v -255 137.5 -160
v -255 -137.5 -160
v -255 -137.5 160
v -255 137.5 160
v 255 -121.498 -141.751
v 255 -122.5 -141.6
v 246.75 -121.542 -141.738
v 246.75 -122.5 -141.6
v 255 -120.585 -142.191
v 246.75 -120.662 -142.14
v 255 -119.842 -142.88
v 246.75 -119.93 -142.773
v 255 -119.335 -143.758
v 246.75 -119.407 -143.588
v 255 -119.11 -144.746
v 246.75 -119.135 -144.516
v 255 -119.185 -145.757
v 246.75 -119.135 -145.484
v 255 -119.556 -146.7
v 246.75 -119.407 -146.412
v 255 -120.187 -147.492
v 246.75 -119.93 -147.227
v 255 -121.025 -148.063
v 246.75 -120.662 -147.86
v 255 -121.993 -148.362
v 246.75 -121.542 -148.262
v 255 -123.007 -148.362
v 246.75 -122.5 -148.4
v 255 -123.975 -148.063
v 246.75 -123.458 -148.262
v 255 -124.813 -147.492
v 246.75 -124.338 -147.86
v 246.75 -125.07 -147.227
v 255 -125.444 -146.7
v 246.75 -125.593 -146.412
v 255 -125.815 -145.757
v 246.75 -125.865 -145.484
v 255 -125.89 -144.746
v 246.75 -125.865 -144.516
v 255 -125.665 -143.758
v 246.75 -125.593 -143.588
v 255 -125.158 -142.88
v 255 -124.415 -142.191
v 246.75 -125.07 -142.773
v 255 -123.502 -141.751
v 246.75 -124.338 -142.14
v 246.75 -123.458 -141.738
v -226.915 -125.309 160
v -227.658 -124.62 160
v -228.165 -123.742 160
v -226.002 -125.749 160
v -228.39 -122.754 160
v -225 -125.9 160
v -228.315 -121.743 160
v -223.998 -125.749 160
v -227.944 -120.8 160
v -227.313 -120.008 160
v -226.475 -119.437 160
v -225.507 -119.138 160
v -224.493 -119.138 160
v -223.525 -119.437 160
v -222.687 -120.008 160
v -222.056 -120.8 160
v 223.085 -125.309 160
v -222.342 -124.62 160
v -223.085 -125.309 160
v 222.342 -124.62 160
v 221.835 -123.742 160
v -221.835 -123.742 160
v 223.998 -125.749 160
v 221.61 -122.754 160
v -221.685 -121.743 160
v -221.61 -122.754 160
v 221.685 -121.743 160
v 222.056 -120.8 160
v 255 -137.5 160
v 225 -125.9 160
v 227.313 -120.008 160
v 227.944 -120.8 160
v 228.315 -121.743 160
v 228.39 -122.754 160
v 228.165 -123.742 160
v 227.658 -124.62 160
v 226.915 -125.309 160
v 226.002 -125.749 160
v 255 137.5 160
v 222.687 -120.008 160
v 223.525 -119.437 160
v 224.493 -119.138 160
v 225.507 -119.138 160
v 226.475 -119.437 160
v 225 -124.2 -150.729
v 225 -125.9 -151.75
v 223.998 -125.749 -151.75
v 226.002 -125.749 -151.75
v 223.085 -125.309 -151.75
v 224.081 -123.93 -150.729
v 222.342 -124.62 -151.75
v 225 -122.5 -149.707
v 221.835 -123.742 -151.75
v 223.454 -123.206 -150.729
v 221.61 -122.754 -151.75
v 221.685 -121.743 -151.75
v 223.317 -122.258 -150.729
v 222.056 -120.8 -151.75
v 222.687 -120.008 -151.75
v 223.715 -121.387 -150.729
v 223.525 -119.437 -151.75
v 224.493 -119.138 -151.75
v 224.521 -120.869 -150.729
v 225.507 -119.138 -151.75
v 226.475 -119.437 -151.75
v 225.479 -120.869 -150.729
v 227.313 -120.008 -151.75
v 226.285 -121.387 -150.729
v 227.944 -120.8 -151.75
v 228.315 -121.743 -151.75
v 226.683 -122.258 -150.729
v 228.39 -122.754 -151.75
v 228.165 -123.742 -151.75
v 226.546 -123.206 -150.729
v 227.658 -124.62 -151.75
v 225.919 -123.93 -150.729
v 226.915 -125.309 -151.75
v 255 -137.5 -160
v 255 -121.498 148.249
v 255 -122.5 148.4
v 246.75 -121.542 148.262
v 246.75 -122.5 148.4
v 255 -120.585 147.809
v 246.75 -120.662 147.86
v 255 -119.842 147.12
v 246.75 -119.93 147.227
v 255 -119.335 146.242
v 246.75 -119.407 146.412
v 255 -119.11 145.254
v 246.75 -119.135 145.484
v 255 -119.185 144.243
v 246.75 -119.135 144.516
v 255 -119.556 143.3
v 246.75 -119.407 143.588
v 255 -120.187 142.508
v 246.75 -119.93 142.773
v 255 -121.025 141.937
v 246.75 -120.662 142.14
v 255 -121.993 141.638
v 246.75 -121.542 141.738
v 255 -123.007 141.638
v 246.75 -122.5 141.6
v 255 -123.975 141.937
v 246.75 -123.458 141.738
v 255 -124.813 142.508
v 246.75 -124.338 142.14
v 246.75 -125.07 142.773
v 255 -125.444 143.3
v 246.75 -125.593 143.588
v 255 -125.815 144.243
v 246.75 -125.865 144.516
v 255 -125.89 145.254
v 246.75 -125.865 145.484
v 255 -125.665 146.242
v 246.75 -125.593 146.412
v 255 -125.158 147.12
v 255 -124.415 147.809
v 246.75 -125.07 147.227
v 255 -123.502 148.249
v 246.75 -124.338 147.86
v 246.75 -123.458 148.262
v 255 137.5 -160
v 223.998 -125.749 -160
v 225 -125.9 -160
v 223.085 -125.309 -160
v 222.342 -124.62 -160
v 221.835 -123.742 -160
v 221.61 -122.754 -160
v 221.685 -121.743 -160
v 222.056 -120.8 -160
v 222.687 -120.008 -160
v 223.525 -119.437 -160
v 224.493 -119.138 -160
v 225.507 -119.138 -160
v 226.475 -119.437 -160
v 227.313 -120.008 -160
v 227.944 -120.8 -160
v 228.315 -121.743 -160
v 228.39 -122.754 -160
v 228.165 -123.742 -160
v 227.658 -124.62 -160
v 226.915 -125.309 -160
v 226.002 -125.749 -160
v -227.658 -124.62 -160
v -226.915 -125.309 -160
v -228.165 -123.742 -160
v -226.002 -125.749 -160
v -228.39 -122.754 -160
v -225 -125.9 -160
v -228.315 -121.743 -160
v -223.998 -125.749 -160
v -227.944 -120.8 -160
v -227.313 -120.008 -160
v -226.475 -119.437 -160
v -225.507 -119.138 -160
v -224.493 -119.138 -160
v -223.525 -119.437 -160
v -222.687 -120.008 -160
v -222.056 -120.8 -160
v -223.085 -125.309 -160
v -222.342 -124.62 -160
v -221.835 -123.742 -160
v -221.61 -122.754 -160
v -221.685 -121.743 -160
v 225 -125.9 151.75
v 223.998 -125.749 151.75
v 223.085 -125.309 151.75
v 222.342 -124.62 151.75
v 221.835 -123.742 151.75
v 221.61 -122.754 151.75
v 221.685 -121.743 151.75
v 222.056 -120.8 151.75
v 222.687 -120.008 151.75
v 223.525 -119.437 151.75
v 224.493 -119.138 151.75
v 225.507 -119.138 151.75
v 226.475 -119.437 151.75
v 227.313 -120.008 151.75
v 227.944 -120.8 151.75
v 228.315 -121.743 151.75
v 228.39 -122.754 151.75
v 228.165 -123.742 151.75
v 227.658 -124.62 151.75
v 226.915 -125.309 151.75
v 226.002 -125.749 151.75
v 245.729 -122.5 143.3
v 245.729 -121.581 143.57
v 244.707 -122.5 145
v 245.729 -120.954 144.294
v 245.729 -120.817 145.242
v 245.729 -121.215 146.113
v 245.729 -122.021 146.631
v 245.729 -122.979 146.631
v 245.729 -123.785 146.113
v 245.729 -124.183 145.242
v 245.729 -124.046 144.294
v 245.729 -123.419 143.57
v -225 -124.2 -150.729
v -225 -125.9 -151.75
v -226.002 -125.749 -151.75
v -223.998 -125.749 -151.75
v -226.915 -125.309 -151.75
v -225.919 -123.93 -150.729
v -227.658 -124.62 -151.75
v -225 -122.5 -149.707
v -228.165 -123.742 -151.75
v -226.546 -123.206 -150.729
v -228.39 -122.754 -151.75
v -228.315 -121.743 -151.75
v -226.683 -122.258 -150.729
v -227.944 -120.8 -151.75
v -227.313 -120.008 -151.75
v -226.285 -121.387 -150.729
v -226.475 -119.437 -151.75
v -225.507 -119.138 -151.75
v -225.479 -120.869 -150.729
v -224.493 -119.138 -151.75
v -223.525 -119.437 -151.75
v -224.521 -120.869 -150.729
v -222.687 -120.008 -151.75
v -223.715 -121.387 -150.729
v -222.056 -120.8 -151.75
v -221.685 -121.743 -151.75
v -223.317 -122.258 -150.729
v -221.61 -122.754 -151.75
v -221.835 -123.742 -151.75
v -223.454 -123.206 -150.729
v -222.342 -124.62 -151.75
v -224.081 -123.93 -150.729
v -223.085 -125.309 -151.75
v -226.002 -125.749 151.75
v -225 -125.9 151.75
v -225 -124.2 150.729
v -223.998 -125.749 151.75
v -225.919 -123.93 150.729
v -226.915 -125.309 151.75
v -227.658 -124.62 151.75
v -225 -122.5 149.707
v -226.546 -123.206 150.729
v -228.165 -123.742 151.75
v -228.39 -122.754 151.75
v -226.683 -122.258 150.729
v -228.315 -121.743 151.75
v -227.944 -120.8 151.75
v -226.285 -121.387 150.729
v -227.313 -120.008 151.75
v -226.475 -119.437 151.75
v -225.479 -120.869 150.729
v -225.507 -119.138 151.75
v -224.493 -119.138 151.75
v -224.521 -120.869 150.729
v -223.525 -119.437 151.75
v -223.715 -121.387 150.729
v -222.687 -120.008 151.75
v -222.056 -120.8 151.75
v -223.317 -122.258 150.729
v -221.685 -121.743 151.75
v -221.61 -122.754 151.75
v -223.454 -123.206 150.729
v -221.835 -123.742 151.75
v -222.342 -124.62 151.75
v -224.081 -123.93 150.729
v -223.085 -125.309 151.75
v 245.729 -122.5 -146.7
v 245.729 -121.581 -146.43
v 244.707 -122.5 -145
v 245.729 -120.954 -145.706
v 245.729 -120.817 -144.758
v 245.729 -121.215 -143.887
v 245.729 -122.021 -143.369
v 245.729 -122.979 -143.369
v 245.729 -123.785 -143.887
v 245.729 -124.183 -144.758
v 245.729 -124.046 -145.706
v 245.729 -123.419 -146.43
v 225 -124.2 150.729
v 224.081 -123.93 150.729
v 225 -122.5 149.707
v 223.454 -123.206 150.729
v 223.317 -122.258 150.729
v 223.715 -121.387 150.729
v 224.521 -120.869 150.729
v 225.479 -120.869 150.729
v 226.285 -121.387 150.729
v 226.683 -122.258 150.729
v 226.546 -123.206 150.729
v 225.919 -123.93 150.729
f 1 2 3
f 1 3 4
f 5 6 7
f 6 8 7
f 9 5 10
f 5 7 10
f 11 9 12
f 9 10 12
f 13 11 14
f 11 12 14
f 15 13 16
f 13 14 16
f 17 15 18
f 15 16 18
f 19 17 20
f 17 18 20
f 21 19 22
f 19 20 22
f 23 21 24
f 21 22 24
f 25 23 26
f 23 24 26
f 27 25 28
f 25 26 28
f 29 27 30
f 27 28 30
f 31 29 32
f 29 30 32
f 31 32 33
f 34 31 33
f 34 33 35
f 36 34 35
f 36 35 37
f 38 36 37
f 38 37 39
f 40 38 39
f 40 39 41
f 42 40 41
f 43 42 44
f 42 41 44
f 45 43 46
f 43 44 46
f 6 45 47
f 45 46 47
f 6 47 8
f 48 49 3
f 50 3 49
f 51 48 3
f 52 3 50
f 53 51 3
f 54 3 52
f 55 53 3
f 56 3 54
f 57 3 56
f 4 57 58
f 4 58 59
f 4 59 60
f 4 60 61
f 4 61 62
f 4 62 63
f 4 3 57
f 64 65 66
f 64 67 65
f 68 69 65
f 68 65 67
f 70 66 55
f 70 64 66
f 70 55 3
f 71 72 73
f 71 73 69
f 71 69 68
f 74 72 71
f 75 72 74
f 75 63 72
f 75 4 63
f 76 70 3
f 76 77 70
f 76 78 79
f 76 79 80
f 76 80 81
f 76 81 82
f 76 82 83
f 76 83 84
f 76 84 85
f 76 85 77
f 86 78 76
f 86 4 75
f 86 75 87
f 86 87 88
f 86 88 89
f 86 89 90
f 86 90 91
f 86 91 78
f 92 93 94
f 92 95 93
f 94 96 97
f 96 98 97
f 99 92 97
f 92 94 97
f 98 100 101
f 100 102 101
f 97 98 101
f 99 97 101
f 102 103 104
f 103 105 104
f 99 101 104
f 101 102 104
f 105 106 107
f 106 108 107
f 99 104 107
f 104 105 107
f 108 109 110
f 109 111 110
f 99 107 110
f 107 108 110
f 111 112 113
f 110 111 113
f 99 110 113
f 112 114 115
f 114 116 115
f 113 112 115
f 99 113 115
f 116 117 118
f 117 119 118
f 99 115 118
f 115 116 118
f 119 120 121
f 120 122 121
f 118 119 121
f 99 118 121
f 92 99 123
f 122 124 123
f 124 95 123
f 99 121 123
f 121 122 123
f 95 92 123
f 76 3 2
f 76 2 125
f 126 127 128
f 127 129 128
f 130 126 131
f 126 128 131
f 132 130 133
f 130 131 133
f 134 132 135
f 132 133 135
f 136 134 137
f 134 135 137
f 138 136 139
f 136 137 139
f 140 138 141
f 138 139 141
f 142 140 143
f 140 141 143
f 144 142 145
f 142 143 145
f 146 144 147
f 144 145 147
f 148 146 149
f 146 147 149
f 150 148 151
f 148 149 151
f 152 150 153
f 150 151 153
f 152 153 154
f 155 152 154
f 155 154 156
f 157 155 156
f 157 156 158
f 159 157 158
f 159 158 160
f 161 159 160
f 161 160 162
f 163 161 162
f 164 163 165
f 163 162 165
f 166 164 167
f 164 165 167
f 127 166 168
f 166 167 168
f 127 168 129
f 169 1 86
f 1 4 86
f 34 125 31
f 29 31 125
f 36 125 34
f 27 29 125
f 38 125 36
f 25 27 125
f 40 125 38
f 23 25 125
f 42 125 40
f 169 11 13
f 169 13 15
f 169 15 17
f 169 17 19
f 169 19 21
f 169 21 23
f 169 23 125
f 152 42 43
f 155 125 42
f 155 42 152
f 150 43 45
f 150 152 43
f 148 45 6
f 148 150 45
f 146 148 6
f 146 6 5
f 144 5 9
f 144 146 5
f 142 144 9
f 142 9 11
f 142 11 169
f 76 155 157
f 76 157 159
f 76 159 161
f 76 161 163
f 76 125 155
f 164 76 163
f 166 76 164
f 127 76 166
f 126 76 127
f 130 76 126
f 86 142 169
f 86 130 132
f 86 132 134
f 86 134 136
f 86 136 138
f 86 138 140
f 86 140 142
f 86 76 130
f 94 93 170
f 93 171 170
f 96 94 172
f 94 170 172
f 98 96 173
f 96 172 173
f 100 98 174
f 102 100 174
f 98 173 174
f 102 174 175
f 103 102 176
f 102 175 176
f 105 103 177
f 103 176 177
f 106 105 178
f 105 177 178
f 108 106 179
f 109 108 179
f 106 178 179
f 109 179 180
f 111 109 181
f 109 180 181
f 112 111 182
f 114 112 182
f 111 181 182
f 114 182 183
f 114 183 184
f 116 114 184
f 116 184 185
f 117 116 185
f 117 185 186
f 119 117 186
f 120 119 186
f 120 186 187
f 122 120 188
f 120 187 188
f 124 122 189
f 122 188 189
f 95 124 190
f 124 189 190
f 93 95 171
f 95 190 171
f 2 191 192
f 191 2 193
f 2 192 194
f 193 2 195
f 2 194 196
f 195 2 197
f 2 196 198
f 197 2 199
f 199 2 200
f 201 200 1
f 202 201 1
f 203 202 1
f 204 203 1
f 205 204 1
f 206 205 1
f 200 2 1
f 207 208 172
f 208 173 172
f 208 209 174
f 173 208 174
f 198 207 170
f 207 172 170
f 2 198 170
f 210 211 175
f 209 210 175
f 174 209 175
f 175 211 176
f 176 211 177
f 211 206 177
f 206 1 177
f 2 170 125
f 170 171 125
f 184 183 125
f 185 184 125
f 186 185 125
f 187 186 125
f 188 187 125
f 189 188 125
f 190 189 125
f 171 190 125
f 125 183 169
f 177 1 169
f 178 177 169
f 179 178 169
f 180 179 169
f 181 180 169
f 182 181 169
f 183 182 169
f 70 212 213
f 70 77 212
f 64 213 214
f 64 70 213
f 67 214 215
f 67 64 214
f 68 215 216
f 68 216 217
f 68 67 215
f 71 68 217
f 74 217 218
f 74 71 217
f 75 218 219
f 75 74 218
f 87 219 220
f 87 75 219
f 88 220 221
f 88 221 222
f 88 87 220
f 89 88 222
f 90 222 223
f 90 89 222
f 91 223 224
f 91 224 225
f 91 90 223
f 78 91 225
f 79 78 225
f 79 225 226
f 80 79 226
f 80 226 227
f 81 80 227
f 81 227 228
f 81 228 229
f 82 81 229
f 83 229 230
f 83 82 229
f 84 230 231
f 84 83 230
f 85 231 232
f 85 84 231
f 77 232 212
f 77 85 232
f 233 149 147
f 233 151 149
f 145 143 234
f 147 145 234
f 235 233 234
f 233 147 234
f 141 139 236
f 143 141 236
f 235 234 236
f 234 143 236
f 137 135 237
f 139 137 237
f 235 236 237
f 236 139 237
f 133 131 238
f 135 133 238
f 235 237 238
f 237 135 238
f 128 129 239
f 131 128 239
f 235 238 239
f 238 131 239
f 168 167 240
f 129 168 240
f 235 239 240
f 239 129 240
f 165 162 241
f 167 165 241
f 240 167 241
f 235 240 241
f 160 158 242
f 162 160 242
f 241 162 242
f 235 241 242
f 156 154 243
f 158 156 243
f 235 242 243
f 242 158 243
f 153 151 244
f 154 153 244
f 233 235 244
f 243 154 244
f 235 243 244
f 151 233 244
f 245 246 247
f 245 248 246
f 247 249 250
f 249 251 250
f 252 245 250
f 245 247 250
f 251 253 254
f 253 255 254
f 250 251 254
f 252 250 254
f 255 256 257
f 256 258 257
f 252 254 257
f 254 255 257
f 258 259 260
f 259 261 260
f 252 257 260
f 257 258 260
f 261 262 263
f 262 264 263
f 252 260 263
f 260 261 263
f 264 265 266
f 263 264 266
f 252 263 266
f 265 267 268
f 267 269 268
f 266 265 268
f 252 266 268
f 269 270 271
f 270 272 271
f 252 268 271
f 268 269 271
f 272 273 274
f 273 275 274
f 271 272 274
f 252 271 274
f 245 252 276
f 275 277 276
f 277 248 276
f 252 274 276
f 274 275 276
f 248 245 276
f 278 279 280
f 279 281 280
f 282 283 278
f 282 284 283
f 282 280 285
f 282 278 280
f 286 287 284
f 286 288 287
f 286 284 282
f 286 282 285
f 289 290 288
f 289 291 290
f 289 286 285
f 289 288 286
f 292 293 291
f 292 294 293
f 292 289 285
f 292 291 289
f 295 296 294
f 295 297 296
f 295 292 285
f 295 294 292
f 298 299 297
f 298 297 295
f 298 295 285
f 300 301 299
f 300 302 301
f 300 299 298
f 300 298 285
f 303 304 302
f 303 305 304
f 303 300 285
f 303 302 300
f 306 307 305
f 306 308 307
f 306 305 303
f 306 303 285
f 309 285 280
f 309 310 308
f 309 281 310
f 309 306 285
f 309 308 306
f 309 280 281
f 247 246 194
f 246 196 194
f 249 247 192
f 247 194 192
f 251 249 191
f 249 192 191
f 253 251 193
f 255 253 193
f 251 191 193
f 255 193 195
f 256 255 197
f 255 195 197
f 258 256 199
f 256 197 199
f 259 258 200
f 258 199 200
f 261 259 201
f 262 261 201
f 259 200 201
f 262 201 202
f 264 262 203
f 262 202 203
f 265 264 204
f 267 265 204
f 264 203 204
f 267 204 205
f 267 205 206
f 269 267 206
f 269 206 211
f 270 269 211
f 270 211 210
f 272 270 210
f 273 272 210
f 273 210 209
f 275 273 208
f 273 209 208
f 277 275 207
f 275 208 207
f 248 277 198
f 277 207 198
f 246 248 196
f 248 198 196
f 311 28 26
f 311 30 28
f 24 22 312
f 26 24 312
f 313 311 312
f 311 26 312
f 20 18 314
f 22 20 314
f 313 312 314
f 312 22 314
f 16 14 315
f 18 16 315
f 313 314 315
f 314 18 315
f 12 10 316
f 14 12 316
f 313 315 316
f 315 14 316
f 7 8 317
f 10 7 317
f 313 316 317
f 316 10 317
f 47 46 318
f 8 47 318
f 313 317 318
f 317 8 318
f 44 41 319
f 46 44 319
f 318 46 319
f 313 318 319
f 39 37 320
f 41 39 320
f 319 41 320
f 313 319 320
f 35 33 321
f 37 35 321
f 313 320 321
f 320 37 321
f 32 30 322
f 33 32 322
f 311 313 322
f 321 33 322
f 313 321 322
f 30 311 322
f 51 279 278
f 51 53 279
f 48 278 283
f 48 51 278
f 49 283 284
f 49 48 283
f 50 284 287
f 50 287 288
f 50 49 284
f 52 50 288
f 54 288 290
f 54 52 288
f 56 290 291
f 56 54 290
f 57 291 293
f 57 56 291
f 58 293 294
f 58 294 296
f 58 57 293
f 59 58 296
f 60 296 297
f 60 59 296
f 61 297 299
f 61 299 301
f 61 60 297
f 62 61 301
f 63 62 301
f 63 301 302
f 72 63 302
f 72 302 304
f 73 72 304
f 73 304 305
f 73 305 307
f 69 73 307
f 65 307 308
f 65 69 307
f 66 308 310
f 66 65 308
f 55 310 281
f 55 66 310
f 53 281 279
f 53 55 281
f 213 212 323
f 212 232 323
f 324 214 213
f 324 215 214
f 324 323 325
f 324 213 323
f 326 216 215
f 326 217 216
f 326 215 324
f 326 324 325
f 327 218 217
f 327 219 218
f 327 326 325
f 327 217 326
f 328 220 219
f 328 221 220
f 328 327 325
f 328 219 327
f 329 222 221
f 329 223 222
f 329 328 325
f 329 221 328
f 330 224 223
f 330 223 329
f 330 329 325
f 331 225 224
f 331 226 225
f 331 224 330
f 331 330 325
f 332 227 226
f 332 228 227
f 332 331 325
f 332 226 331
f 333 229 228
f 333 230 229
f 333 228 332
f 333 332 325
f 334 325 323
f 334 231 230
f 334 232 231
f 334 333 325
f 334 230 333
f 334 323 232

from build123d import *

# Parameters (mm, degrees)
SCHIZZO1_W                     = 510
SCHIZZO1_H                     = 275
ESTRUSIONE_ESTRUSIONE1_DEPTH   = 160
FORO_FILETTATO_M8_1_AT_2_COUNT = 2
FORO_FILETTATO_M8_1_AT_2_PITCH = 450
FORO_FILETTATO_M8_2_D          = 6.8
FORO_FILETTATO_M8_2_DEPTH      = 8.25
FORO_FILETTATO_M8_2_TIP        = 2.042926105


with BuildPart() as part:
    # Schizzo1 → Estrusione-Estrusione1 (new, symmetric)
    with BuildSketch(Plane.XY):
        Rectangle(SCHIZZO1_W, SCHIZZO1_H)
    extrude(amount=ESTRUSIONE_ESTRUSIONE1_DEPTH, both=True)

    # Schizzo4 → Foro filettato M8-1 (revolve, cut)
    with BuildSketch(Plane(origin=(225, -122.5, 160), x_dir=(0, -1, 0), z_dir=(1, 0, 0))):
        Polygon((0, 0), (0, 10.292926105), (3.4, 8.25), (3.4, 0), align=None)
    foro_filettato_m8_1 = revolve(axis=Axis((225, -122.5, 166.35), (0, 0, -1)), mode=Mode.SUBTRACT)

    # Foro filettato M8-1 at 2: Foro filettato M8-1 ×2
    with Locations(*[(-i * FORO_FILETTATO_M8_1_AT_2_PITCH, 0, 0) for i in range(1, FORO_FILETTATO_M8_1_AT_2_COUNT)]):
        add(foro_filettato_m8_1, mode=Mode.SUBTRACT)

    # Foro filettato M8-2
    with Locations(Plane(origin=(255, 0, 0), x_dir=(0, 0, -1), z_dir=(1, 0, 0))):
        with Locations((-145, -122.5), (145, -122.5)):
            Hole(FORO_FILETTATO_M8_2_D / 2, depth=FORO_FILETTATO_M8_2_DEPTH)
            with Locations((0, 0, -(FORO_FILETTATO_M8_2_DEPTH + FORO_FILETTATO_M8_2_TIP / 2))):  # 118° drill point
                Cone(0, FORO_FILETTATO_M8_2_D / 2, FORO_FILETTATO_M8_2_TIP, mode=Mode.SUBTRACT)

    # Specchia1: Foro filettato M8-1 across plane
    add(foro_filettato_m8_1.mirror(Plane.XY), mode=Mode.SUBTRACT)

    # Specchia1 copy 1 sketch → Specchia1 copy 1 (revolve, cut)
    with BuildSketch(Plane(origin=(-225, -122.5, -160), x_dir=(0, -1, 0), z_dir=(1, 0, 0))):
        Polygon((0, 0), (0, -10.292926105), (3.4, -8.25), (3.4, 0), align=None)
    revolve(axis=Axis((-225, -122.5, -166.35), (0, 0, -1)), mode=Mode.SUBTRACT)


solid = part.part
